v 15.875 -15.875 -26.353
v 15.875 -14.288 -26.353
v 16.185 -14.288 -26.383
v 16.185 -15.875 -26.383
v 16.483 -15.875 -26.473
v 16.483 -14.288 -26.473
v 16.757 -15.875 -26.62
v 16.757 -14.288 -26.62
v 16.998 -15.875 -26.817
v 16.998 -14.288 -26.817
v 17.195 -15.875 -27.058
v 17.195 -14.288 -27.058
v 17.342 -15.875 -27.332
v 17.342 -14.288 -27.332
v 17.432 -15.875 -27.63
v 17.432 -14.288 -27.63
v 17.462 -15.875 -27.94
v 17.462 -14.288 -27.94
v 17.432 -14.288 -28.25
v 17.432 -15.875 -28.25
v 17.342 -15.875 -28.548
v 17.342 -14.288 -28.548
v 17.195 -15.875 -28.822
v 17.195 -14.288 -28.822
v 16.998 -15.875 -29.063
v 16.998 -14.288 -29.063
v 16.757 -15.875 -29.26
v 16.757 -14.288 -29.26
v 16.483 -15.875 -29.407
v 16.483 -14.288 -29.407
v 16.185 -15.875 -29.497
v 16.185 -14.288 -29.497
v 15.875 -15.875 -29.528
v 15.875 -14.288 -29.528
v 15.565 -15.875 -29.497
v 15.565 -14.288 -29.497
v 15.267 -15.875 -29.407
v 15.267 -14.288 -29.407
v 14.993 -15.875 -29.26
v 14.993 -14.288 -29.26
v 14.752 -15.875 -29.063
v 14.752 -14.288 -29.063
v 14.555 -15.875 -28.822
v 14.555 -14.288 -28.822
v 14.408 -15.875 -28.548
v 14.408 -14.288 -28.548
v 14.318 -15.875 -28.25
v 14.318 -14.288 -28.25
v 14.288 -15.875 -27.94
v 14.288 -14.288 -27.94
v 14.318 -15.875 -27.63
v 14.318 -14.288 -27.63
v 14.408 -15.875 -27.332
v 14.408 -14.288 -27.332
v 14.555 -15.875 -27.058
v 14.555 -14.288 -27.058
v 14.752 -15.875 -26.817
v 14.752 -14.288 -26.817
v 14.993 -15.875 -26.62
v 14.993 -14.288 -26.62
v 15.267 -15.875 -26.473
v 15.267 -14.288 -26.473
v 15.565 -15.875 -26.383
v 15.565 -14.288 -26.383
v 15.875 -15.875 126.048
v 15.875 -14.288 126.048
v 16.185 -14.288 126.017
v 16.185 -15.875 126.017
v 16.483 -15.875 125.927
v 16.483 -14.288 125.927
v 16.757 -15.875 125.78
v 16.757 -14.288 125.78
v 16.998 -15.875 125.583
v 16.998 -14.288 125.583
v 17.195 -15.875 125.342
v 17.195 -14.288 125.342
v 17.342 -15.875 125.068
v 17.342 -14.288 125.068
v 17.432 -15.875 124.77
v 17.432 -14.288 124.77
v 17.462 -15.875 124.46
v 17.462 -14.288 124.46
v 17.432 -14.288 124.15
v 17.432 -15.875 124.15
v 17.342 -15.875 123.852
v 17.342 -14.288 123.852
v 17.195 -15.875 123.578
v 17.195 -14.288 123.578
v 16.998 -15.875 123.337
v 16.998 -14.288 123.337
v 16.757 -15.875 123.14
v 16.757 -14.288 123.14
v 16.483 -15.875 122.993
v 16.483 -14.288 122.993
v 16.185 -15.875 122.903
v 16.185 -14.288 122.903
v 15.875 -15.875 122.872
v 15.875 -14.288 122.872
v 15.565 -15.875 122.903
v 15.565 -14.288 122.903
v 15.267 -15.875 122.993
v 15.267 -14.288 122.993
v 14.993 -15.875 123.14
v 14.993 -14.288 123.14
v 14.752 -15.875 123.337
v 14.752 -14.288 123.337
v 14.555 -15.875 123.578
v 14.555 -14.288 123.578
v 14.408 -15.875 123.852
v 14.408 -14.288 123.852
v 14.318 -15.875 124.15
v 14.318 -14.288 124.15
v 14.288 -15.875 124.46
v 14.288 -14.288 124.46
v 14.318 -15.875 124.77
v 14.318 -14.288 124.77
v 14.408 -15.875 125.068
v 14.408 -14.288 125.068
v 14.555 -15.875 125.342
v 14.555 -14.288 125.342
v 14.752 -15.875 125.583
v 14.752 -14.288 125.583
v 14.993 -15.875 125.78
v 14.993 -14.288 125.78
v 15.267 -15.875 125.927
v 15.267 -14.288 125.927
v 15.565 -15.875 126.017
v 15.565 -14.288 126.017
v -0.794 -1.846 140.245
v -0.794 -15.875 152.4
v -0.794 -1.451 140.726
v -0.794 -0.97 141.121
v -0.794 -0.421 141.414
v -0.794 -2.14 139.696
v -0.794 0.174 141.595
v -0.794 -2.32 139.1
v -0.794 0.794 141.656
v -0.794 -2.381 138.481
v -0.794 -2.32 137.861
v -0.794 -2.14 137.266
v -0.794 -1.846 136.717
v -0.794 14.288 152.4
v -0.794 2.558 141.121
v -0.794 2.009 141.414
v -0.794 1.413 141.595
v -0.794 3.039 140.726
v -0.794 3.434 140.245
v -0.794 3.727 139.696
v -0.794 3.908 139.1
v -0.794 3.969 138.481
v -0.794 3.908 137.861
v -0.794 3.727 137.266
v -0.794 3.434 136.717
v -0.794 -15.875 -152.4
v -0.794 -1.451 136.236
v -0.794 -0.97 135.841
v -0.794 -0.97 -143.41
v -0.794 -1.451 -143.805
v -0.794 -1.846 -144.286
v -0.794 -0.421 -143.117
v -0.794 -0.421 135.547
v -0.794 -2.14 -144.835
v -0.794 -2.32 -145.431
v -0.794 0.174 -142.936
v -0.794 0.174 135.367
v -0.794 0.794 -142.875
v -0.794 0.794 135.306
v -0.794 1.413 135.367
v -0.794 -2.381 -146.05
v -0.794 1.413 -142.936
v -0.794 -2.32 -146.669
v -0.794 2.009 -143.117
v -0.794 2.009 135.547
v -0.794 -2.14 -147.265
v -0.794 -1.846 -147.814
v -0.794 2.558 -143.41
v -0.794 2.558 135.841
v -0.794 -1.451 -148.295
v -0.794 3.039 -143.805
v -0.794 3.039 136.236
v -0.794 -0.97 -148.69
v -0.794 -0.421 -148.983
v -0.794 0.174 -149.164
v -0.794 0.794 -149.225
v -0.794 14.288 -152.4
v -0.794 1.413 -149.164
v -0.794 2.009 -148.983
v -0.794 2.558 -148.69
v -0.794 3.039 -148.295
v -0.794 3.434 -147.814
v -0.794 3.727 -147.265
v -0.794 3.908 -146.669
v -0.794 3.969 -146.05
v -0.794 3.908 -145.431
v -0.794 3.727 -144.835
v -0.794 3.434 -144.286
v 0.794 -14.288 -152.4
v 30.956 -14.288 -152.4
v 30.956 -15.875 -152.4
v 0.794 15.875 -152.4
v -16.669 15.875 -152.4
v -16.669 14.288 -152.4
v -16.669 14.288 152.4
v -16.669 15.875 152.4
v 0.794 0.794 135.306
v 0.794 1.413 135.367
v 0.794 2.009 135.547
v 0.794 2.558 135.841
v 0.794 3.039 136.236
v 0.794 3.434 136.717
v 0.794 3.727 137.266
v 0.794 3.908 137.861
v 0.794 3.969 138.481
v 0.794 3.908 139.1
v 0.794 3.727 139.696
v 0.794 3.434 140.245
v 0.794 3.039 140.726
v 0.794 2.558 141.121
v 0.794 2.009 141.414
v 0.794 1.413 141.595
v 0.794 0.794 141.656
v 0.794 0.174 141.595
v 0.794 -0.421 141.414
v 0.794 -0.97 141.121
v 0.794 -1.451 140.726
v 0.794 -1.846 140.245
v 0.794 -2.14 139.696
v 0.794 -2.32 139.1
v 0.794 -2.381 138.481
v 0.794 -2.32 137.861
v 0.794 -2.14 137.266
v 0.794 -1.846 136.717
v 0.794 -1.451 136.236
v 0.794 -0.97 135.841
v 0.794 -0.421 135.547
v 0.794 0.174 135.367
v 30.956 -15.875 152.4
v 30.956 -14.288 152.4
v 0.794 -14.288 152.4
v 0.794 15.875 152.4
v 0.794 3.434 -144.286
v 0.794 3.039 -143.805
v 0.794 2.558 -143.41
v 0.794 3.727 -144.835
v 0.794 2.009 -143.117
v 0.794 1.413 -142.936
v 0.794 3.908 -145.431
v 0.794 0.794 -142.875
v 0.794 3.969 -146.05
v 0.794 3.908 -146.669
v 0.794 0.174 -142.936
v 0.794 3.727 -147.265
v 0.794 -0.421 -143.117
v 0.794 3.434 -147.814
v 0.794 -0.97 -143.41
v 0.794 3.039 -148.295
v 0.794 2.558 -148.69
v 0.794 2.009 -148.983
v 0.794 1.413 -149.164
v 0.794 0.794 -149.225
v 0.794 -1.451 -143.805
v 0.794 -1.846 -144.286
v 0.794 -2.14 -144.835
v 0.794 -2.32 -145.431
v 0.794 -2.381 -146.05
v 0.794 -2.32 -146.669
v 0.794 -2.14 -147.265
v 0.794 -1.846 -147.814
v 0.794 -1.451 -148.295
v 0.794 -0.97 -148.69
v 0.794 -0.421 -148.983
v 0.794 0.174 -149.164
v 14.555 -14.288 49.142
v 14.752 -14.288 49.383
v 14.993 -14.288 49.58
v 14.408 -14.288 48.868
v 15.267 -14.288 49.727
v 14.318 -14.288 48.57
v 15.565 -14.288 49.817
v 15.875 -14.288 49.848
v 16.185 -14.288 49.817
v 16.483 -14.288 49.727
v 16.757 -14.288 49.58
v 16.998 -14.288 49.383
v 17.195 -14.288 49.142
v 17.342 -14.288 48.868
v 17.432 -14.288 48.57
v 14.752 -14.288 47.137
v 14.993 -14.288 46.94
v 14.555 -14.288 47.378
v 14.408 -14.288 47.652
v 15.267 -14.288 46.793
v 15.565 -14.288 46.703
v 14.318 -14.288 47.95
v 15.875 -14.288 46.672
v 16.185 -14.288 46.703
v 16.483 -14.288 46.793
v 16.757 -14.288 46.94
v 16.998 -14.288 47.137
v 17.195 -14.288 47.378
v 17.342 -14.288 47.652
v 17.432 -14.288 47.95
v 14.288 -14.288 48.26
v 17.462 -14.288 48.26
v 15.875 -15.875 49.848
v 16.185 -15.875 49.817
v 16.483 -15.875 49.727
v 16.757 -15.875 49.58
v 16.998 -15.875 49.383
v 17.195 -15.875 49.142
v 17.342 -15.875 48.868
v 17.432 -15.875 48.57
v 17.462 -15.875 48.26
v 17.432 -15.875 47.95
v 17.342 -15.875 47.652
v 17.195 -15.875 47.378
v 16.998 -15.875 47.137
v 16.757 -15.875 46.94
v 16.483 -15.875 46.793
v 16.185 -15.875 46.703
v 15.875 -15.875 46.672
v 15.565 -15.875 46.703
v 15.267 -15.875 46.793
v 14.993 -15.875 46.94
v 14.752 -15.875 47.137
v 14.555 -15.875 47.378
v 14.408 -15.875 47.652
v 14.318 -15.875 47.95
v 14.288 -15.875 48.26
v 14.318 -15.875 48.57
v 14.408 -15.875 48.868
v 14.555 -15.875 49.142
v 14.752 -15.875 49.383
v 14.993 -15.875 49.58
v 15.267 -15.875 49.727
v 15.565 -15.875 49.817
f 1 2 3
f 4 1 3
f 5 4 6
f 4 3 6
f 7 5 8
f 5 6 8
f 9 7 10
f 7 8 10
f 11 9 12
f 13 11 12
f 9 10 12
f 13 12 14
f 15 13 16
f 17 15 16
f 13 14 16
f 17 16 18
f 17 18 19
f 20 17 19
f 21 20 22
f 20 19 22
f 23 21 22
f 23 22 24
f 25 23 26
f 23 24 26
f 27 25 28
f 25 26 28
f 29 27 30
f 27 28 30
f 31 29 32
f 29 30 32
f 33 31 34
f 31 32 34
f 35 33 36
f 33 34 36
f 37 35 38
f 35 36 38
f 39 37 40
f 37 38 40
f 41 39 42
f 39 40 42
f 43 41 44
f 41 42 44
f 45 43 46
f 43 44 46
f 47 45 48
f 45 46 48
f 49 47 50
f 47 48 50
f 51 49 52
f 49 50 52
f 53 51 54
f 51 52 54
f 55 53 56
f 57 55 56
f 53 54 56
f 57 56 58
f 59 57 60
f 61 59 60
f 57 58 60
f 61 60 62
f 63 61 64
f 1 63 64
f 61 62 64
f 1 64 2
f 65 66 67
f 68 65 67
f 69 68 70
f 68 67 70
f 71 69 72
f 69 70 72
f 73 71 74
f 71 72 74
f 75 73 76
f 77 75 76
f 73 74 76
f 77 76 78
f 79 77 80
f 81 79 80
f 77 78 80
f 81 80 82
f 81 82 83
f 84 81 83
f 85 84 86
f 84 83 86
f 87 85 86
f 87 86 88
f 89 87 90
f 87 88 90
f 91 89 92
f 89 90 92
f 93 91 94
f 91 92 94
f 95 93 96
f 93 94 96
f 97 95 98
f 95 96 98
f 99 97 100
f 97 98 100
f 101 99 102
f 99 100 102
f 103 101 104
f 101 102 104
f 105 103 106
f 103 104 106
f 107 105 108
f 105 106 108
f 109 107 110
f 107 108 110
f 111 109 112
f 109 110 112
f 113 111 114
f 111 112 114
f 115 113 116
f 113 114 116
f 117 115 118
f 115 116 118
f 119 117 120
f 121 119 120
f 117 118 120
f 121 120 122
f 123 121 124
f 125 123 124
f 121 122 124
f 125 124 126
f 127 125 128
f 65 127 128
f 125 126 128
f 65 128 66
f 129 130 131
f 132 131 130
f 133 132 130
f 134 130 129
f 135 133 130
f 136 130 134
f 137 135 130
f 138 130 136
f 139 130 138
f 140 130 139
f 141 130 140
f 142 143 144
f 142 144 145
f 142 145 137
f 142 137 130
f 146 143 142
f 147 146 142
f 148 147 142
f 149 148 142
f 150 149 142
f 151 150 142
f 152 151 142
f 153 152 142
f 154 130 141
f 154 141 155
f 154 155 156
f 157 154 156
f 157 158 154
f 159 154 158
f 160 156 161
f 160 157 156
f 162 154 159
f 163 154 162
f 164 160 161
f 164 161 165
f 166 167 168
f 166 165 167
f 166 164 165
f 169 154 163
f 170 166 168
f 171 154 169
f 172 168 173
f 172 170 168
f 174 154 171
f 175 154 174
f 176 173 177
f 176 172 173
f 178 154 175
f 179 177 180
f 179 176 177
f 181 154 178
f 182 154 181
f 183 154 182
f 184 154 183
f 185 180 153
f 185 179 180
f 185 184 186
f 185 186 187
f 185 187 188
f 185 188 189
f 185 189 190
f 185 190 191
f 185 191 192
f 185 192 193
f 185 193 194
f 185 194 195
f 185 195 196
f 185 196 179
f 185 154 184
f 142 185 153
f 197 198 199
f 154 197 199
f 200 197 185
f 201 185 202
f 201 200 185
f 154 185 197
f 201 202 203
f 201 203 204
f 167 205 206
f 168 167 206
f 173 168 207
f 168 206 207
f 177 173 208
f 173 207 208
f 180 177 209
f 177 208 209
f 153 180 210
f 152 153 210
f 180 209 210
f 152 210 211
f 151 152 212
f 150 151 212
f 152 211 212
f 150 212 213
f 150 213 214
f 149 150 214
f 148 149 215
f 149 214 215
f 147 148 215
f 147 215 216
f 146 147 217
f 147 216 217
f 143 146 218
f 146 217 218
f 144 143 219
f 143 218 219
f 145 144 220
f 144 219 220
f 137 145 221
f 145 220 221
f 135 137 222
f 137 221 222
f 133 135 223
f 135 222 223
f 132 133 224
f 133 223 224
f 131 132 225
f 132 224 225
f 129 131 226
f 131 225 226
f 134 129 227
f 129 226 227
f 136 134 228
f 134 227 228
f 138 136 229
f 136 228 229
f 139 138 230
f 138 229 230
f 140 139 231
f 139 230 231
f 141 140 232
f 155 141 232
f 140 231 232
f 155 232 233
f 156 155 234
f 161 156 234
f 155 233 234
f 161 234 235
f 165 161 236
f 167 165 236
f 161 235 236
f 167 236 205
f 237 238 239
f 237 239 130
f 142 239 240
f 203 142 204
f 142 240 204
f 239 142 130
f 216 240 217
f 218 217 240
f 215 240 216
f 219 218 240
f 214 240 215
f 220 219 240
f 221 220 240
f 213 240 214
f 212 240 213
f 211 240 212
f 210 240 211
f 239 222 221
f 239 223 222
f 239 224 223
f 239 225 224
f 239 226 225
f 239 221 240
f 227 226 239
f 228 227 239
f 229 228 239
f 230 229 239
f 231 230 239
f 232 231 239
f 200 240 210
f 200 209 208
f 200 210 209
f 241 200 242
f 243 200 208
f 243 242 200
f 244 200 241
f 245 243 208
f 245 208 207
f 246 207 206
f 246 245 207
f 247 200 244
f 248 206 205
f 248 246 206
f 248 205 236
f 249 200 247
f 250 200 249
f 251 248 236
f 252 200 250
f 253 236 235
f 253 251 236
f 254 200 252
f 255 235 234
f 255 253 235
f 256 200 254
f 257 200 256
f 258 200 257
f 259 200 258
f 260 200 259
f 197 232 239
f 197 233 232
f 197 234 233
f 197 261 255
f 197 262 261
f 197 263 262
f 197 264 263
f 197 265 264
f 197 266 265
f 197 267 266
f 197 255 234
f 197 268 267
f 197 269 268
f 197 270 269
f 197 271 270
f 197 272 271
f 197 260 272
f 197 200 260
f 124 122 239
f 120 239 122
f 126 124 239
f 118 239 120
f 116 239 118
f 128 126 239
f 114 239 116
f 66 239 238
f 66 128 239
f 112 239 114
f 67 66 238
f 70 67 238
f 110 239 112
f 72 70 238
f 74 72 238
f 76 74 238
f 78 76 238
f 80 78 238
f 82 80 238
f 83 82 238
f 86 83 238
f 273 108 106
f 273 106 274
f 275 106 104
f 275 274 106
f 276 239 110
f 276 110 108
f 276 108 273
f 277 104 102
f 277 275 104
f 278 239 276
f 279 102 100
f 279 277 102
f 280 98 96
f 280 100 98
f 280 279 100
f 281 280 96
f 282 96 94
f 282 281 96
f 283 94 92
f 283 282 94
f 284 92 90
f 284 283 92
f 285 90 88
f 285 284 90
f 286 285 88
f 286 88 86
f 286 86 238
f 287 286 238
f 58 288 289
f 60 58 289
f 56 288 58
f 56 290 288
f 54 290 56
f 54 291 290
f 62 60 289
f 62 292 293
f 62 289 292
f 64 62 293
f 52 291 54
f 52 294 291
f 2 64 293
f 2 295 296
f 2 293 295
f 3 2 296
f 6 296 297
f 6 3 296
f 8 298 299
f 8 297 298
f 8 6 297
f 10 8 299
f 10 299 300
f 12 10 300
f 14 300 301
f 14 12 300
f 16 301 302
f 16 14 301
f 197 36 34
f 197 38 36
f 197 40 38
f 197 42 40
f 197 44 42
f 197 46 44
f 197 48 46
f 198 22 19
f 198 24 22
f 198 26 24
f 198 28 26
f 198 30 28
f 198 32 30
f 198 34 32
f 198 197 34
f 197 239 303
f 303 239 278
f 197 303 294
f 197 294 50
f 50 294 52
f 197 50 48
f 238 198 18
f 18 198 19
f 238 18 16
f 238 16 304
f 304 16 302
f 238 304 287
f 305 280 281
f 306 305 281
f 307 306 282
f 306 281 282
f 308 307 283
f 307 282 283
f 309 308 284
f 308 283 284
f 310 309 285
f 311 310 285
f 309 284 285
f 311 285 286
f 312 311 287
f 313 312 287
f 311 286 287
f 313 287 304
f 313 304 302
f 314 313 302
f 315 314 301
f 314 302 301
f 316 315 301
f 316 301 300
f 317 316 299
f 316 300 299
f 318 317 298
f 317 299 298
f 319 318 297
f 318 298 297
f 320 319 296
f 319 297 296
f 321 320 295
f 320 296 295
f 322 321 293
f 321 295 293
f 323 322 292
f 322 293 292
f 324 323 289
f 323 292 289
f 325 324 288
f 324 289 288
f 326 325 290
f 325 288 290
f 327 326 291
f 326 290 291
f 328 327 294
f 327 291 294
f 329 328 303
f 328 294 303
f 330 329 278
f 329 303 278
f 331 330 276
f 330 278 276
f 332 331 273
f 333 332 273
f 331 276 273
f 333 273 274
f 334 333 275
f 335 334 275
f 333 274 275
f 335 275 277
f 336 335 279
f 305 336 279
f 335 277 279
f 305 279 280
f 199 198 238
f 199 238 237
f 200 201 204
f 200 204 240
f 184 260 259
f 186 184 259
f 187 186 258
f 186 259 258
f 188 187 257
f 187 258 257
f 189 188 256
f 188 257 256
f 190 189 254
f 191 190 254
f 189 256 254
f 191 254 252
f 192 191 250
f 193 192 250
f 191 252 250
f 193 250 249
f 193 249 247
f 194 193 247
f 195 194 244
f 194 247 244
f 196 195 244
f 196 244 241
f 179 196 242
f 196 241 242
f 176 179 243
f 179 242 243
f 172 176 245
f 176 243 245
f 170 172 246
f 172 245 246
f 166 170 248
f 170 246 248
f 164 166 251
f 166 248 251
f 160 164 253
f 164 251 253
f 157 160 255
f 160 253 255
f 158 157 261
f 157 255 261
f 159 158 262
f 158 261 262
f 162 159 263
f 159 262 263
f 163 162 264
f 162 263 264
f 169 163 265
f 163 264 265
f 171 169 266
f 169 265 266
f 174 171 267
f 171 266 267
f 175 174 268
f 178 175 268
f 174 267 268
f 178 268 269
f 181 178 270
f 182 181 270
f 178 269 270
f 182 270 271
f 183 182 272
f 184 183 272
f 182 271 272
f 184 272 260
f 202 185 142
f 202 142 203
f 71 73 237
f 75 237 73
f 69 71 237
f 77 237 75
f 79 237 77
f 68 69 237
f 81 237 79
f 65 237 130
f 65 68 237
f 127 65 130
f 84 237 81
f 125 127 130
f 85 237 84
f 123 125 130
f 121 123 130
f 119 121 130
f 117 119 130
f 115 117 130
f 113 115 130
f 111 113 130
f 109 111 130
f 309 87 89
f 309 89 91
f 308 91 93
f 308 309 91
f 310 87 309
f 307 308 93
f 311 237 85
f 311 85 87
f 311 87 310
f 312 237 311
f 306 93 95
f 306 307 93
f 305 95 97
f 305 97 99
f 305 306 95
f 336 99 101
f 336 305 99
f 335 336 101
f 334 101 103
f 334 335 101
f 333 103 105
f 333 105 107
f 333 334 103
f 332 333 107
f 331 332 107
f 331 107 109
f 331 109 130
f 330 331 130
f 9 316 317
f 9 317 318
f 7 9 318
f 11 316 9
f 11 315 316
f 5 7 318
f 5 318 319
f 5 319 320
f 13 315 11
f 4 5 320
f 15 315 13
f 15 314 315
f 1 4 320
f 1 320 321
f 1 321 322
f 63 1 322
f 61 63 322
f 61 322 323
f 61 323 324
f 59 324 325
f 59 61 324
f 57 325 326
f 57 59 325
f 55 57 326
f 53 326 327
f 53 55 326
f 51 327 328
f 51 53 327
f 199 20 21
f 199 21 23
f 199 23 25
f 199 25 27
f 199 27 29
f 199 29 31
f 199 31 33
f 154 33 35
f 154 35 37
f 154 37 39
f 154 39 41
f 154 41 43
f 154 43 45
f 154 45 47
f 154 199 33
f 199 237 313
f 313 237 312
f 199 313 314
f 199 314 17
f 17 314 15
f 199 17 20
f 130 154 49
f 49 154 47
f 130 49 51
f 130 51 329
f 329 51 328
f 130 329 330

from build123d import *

# Parameters (mm, degrees)
BOSS_EXTRUDE1_DEPTH      = 152.4
BOSS_EXTRUDE1_DEPTH_BACK = 152.4
SKETCH4_R                = 1.5875
CUT_EXTRUDE1_DEPTH       = 1.5875
SKETCH5_R                = 3.175
CUT_EXTRUDE2_DEPTH       = 1.5875


with BuildPart() as part:
    # Sketch3 → Boss-Extrude1 (new, two sides: drawn at the far end of the back side and taken through both)
    with BuildSketch(Plane.XY.offset(-BOSS_EXTRUDE1_DEPTH_BACK)):
        Polygon((30.95625, -14.2875), (30.95625, -15.875), (-0.79375, -15.875), (-0.79375, 14.2875), (-16.66875, 14.2875), (-16.66875, 15.875), (0.79375, 15.875), (0.79375, -14.2875), align=None)
    extrude(amount=BOSS_EXTRUDE1_DEPTH + BOSS_EXTRUDE1_DEPTH_BACK)

    # Sketch4 → Cut-Extrude1 (cut)
    with BuildSketch(Plane(origin=(0, -14.2875, 0), x_dir=(1, 0, 0), z_dir=(0, 1, 0))):
        with Locations(Location((15.875, 27.94, 0), (0, 0, 270))):
            Circle(SKETCH4_R)
        with Locations(Location((15.875, -48.26, 0), (0, 0, 270))):
            Circle(SKETCH4_R)
        with Locations(Location((15.875, -124.46, 0), (0, 0, 270))):
            Circle(SKETCH4_R)
    extrude(amount=-CUT_EXTRUDE1_DEPTH, mode=Mode.SUBTRACT)

    # Sketch5 → Cut-Extrude2 (cut)
    with BuildSketch(Plane(origin=(0.79375, 0, 0), x_dir=(0, 0, -1), z_dir=(1, 0, 0))):
        with Locations((-138.4808, 0.79375)):
            Circle(SKETCH5_R)
        with Locations((146.05, 0.79375)):
            Circle(SKETCH5_R)
    extrude(amount=-CUT_EXTRUDE2_DEPTH, mode=Mode.SUBTRACT)


solid = part.part
